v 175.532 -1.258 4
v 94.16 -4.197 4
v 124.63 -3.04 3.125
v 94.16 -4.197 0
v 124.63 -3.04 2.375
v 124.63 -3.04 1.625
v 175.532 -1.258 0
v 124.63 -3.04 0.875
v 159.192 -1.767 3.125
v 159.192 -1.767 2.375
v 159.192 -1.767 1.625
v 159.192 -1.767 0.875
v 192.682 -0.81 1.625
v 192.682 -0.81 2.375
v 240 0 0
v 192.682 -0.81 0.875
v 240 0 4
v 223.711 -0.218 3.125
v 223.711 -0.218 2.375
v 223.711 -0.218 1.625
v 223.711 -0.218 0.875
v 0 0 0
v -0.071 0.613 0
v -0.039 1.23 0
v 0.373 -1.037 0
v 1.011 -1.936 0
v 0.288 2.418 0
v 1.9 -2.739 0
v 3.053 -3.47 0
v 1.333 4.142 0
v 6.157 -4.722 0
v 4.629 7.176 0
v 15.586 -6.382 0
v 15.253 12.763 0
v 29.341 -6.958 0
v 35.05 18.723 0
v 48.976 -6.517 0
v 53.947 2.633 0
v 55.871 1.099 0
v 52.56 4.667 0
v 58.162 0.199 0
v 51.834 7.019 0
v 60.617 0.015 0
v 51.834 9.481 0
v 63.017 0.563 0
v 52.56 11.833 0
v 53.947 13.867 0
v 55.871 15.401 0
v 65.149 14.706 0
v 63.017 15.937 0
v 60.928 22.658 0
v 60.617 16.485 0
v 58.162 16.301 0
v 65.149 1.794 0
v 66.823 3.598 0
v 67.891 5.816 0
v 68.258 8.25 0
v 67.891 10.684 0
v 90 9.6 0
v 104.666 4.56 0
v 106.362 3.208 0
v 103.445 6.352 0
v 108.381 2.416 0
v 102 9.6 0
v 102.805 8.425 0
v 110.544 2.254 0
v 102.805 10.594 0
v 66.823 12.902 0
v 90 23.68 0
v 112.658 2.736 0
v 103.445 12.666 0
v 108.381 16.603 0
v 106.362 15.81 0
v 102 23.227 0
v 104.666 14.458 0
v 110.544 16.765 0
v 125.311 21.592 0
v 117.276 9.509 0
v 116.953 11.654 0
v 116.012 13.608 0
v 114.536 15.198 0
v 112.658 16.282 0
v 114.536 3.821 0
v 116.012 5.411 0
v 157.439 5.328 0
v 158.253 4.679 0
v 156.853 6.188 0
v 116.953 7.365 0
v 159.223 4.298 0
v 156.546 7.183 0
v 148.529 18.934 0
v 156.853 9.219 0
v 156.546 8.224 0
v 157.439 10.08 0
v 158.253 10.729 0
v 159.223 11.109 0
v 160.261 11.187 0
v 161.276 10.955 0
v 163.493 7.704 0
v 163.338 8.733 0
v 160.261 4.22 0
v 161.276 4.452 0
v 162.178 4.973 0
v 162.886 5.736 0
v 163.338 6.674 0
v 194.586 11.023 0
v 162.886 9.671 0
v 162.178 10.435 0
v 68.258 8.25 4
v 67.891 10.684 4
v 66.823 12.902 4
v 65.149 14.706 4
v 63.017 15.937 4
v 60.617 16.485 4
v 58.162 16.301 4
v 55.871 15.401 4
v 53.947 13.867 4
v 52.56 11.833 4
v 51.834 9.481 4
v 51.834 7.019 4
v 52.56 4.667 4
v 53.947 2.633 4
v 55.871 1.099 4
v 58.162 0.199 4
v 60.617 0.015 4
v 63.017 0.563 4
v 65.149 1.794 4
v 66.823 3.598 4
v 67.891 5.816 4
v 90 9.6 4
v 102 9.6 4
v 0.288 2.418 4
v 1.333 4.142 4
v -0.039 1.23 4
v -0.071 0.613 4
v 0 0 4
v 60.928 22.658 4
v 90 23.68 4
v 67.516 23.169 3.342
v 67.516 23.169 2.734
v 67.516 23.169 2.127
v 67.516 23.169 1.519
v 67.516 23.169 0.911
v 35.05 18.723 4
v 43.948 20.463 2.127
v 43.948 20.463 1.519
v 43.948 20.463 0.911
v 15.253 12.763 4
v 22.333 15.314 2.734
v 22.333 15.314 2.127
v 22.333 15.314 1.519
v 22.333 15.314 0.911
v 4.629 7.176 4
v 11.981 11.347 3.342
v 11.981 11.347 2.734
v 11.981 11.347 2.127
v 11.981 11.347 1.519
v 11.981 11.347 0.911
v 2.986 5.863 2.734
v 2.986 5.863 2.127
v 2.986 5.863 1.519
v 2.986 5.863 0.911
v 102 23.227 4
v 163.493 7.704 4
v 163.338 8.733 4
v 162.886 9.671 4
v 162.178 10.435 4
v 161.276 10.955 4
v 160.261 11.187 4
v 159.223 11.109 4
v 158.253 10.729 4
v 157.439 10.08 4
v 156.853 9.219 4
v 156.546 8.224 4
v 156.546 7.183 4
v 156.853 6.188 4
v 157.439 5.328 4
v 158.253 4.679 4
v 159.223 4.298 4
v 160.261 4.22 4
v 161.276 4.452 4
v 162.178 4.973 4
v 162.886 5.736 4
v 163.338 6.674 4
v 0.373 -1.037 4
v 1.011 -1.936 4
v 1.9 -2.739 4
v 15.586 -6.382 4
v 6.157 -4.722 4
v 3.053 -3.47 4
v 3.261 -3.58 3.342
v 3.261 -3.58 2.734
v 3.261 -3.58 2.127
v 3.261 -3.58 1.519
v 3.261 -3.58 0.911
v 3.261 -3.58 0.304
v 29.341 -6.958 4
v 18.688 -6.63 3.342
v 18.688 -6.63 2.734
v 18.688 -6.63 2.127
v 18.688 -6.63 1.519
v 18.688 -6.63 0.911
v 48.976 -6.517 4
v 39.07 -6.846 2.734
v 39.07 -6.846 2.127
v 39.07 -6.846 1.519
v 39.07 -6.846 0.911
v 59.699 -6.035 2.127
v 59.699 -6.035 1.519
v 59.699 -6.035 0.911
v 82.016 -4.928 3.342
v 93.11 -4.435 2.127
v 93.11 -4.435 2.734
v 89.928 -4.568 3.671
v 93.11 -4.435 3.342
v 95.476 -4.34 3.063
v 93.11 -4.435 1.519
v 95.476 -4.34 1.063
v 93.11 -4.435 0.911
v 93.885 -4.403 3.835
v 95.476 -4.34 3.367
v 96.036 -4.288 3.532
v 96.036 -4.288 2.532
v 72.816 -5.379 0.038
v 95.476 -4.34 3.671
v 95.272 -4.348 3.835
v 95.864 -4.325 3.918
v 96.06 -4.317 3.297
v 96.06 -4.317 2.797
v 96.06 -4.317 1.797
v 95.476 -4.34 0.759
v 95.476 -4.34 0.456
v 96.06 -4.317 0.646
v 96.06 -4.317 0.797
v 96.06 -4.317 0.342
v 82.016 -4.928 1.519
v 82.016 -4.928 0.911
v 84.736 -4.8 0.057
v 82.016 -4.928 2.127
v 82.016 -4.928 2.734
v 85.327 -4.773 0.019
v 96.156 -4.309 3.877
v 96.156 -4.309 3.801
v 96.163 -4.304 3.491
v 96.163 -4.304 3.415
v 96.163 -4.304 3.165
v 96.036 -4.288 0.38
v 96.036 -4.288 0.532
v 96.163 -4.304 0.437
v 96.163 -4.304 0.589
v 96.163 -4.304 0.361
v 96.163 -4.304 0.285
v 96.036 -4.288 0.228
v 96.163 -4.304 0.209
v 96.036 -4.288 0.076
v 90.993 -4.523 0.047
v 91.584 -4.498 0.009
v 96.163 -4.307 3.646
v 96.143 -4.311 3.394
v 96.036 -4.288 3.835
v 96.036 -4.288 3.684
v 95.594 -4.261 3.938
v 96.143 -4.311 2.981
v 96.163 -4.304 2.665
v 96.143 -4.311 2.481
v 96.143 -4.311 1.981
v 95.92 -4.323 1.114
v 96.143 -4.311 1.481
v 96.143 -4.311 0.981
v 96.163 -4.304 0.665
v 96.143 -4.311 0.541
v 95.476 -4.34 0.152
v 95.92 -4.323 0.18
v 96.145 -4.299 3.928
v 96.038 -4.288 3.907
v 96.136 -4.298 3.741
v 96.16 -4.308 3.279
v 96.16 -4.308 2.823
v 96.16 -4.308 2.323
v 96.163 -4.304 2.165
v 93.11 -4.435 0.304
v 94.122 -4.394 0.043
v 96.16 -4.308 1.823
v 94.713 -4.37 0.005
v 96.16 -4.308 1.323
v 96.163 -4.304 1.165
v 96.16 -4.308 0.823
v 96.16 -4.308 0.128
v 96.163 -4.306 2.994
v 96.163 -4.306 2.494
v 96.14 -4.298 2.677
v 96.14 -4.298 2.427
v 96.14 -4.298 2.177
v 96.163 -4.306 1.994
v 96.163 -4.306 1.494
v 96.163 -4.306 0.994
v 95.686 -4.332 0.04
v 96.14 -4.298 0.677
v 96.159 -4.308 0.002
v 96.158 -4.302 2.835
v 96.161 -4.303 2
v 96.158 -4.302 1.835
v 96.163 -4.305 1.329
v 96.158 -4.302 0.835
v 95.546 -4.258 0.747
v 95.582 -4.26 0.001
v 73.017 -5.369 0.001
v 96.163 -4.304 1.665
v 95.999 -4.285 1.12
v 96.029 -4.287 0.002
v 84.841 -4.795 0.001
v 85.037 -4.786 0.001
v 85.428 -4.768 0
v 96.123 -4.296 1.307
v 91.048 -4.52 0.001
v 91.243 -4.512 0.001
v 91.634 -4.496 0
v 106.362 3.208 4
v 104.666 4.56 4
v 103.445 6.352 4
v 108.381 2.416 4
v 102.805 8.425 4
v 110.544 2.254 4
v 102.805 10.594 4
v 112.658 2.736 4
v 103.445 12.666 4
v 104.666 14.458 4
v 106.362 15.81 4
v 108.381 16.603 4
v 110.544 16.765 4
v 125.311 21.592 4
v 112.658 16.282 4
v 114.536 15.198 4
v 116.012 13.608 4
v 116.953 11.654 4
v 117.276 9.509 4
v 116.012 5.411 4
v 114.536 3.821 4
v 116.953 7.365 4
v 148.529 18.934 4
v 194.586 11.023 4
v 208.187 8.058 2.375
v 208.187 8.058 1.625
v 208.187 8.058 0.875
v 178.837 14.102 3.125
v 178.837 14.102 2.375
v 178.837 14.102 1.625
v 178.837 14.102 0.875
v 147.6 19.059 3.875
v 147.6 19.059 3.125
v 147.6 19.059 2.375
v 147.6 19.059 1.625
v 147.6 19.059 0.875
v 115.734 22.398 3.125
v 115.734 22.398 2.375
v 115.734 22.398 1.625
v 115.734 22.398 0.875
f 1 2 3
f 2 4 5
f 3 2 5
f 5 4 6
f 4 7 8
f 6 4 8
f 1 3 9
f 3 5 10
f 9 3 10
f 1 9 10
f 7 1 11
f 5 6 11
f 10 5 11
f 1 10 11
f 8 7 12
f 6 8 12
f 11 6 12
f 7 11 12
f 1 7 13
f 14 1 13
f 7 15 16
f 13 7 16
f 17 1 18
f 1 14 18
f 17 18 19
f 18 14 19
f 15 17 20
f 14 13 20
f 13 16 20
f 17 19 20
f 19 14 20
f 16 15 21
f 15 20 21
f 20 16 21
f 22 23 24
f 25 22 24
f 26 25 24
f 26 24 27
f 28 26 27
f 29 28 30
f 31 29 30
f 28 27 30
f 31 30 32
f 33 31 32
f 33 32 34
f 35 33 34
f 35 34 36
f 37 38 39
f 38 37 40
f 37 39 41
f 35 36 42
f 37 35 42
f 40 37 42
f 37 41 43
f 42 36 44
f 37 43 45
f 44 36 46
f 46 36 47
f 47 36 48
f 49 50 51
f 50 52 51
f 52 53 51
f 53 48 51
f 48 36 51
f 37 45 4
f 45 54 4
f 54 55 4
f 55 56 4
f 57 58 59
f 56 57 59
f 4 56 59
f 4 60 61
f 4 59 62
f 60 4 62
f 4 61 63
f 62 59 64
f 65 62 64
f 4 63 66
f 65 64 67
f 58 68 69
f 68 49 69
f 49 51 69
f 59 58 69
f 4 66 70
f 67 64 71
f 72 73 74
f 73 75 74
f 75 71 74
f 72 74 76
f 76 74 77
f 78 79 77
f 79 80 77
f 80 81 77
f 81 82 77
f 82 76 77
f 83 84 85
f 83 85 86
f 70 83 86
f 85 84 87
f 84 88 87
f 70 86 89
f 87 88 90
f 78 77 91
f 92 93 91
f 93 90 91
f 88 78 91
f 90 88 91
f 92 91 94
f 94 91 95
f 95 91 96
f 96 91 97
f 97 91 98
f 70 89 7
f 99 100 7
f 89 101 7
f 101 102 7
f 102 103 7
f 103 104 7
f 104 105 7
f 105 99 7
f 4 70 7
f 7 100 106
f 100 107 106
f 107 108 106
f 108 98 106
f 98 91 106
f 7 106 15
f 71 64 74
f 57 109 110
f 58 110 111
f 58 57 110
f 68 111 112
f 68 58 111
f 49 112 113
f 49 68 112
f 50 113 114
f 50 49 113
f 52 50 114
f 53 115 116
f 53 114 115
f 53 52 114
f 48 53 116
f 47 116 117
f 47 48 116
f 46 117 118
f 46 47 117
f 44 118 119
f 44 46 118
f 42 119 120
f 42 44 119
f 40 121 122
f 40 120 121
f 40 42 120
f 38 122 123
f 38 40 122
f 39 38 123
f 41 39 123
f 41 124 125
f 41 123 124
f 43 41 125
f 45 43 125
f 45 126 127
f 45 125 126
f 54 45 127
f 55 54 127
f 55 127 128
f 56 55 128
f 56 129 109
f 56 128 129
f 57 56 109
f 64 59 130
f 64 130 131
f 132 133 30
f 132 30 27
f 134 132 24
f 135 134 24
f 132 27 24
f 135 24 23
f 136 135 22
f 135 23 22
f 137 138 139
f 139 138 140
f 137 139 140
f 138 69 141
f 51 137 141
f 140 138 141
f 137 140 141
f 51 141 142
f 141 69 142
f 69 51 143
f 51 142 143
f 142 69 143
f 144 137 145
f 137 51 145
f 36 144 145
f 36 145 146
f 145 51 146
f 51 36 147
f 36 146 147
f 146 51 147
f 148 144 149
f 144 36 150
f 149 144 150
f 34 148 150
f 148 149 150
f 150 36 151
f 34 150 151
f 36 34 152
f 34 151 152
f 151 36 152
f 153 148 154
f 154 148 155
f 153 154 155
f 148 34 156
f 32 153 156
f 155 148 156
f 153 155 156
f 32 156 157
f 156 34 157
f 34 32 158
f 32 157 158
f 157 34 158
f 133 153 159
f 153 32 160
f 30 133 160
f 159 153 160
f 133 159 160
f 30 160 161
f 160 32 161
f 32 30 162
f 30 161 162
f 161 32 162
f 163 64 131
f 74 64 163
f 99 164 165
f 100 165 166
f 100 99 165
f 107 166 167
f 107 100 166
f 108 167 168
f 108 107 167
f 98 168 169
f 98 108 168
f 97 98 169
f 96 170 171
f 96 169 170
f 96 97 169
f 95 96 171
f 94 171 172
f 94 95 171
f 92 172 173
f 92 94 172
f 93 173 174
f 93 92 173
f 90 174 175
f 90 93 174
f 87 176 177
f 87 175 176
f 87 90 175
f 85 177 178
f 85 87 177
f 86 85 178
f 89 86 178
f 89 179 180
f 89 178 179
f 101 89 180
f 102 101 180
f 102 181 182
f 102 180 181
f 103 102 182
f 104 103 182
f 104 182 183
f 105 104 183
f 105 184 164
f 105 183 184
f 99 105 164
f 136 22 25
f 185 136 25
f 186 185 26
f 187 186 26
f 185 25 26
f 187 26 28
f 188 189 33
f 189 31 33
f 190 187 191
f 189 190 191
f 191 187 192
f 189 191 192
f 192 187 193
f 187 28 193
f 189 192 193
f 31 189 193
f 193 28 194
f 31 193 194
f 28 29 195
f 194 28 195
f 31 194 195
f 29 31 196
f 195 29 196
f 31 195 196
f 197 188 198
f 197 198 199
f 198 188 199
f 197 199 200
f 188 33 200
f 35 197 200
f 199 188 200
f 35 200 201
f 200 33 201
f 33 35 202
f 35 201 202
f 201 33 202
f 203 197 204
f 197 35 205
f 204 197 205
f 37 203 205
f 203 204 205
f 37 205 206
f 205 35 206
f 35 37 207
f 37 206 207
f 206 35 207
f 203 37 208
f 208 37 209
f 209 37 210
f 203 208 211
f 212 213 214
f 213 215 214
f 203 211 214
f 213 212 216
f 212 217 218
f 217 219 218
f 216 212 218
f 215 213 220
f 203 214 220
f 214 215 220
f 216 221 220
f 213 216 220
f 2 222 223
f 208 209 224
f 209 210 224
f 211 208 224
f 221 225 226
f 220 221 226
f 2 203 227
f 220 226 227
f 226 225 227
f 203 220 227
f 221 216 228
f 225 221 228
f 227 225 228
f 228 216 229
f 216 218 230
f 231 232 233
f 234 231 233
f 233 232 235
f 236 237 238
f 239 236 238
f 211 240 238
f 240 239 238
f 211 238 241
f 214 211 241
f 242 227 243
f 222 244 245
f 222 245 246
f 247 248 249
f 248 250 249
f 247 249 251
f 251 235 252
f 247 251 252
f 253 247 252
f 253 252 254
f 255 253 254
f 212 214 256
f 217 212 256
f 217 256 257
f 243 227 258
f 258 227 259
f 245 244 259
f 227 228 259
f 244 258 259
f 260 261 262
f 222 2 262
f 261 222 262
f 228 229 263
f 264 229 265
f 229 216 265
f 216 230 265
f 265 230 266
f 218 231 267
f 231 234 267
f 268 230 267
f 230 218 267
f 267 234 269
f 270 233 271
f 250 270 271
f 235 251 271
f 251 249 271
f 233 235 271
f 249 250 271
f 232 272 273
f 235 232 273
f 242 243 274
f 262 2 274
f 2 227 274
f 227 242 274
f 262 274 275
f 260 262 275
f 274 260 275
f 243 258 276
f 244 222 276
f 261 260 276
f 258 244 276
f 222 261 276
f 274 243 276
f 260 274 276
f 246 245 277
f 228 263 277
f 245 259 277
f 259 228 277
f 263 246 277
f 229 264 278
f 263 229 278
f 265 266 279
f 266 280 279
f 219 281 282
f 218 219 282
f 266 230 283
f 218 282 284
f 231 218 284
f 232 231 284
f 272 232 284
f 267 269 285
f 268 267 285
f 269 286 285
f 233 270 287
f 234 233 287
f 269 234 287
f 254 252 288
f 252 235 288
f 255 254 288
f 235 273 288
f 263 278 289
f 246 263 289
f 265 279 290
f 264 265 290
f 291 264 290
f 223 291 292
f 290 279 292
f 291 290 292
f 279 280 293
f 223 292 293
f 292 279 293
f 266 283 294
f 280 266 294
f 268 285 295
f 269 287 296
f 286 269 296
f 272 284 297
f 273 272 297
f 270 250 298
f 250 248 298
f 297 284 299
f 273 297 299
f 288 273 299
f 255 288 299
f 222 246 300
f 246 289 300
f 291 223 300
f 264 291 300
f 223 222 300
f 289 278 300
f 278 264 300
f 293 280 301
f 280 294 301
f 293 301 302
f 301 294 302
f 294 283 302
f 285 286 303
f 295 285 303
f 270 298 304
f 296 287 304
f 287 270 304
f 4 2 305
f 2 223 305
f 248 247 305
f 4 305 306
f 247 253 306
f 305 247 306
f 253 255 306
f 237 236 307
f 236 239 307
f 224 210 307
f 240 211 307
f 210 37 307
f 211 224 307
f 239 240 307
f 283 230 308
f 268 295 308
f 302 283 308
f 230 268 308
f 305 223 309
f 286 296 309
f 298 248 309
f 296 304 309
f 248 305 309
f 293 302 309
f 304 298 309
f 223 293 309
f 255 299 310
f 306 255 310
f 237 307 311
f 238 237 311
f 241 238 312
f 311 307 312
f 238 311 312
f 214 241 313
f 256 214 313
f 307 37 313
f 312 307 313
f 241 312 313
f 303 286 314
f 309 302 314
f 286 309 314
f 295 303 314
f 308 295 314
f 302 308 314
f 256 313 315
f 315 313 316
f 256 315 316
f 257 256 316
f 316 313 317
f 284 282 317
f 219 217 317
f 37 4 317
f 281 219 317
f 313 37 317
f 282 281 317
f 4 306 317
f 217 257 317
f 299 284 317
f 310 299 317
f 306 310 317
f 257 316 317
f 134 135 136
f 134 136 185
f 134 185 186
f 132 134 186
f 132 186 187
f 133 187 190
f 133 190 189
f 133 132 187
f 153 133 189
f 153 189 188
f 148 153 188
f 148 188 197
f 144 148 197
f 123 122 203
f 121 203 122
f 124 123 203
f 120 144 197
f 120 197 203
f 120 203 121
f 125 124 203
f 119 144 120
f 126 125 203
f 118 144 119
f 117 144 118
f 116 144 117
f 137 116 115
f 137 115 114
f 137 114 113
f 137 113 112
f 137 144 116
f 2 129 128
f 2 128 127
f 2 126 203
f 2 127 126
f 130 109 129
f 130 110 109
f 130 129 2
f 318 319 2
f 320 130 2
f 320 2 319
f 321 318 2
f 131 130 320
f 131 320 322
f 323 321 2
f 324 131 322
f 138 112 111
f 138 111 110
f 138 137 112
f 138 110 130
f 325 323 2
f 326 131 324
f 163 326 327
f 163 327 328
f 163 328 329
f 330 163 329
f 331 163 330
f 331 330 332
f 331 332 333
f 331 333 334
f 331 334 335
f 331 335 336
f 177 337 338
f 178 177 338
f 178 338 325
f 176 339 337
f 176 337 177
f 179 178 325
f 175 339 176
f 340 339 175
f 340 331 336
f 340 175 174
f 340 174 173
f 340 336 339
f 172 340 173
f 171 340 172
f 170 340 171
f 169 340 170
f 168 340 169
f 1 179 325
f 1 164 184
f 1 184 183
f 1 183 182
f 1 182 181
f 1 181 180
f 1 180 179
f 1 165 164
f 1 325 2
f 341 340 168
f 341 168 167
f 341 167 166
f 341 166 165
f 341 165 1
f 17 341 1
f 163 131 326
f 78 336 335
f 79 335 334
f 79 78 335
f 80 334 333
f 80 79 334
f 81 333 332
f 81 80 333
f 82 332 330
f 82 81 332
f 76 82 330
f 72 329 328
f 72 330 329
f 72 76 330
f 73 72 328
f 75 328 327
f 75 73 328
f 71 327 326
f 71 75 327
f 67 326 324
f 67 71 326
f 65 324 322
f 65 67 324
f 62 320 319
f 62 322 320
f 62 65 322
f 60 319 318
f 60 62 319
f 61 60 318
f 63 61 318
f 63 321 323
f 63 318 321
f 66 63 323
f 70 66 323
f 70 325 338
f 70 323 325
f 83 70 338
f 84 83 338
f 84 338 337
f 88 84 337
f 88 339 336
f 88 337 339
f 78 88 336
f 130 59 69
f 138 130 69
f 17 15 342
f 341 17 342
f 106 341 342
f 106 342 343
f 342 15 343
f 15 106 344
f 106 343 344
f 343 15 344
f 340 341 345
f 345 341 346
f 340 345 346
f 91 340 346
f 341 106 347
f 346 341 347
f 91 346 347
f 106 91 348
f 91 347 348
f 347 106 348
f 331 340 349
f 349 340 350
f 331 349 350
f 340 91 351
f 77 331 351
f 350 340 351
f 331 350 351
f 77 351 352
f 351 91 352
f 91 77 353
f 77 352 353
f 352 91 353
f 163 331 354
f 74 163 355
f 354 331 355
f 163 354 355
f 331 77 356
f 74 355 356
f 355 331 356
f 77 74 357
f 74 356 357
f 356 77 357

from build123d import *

# Parameters (mm, degrees)
EXTRUDE_1_DEPTH     = 4
SKETCH_2_R          = 8.2578
CUT_EXTRUDE_1_DEPTH = 242.202599346
SKETCH_3_R          = 7.275764765
CUT_EXTRUDE_2_DEPTH = 242.202599346
SKETCH_4_R          = 3.49305919
CUT_EXTRUDE_3_DEPTH = 242.202599346
SKETCH_5_W          = 12
SKETCH_5_H          = 20.4
CUT_EXTRUDE_4_DEPTH = 242.202599346


with BuildPart() as part:
    # 草图1 → 凸台-拉伸1 (new body)
    with BuildSketch(Plane.XY):
        with BuildLine():
            add(Edge.make_bspline(
                [(240, 0), (238.17502762, 0.503877157), (234.552675186, 1.504013196), (229.144749778, 2.936711102), (223.80806151, 4.308267422), (218.540948315, 5.617098938), (213.343197185, 6.866529147), (208.214254003, 8.058388035), (203.15369138, 9.194718503), (198.161080577, 10.277336529), (193.236020433, 11.307957122), (188.378126395, 12.288176228), (183.587030984, 13.219487875), (178.862381096, 14.103288415), (174.20383633, 14.94088935), (169.611066641, 15.733517024), (165.083753424, 16.48233437), (160.621585255, 17.188430181), (156.224259941, 17.852838479), (151.891482042, 18.476541482), (147.622963921, 19.060474437), (143.418423037, 19.605526314), (139.277584839, 20.112556204), (135.200180439, 20.582388904), (131.185946744, 21.015818963), (127.234627591, 21.413621778), (123.345973004, 21.776552314), (119.519739391, 22.105341593), (115.755690711, 22.400727766), (112.053595721, 22.663373335), (108.413239177, 22.894176737), (104.834380856, 23.09312439), (101.31690831, 23.263502654), (98.991812062, 23.353021494), (97.839651, 23.397381)],
                knots=[0, 0, 0, 0, 0.039336668, 0.078078592, 0.116236834, 0.153821599, 0.190842315, 0.227307743, 0.263226027, 0.298604748, 0.333451008, 0.367771481, 0.401572442, 0.434859826, 0.467639254, 0.499916089, 0.53169544, 0.562982199, 0.593781082, 0.62409661, 0.653933172, 0.683295, 0.712186209, 0.740610792, 0.768572632, 0.796075522, 0.823123146, 0.849719099, 0.87586689, 0.901569938, 0.926831572, 0.951655041, 0.976043495, 1, 1, 1, 1], degree=3))
            add(Edge.make_bspline(
                [(97.839651, 23.397381), (97.226966307, 23.449039102), (96.614219107, 23.500702474), (95.999811647, 23.51949076), (95.999560338, 23.519500462), (95.999120662, 23.519516542), (95.998241355, 23.51954958), (95.996482988, 23.519613016), (95.992966008, 23.519741888), (95.985932345, 23.519998315), (95.971865659, 23.520510119), (95.943736443, 23.521535357), (95.887493304, 23.523574403), (95.775067579, 23.527626449), (95.550458266, 23.535617202), (95.102207861, 23.551142578), (94.209582037, 23.580385825), (92.439845376, 23.631737223), (89.936085165, 23.685664421), (86.966992664, 23.719873594), (84.045559907, 23.724232935), (81.17204691, 23.699658881), (78.346701734, 23.647058523), (75.569762496, 23.567335691), (72.841456217, 23.461398305), (70.161999702, 23.330141011), (67.531597571, 23.174466006), (64.95044447, 22.995263944), (62.418723463, 22.793422793), (59.936605574, 22.569833811), (57.504251516, 22.325372701), (55.12180932, 22.06092015), (52.789416328, 21.777345145), (50.507198451, 21.475512573), (48.275269484, 21.156284343), (46.093732456, 20.820512998), (43.962679202, 20.469041082), (41.882190516, 20.102709676), (39.852336011, 19.722346633), (37.873174485, 19.328773149), (35.944754253, 18.922799873), (34.0671133, 18.505228482), (32.240279689, 18.076847911), (30.464271312, 17.638437807), (28.739096854, 17.190765253), (27.064755379, 16.734584348), (25.441236471, 16.270638001), (23.86852294, 15.799649451), (22.346586305, 15.322338273), (20.875393699, 14.839395746), (19.454901269, 14.351509133), (18.085059478, 13.859344064), (16.765811981, 13.363548129), (15.497095001, 12.86475515), (14.278838907, 12.363578802), (13.110967321, 11.860617848), (11.993400347, 11.356444633), (10.926050231, 10.851619269), (9.908825297, 10.346679325), (8.941629343, 9.842141012), (8.024362218, 9.338498323), (7.156916873, 8.836227353), (6.339185804, 8.335776371), (5.571054955, 7.837575288), (4.852407002, 7.342028613), (4.183123727, 6.849513508), (3.563081387, 6.360384134), (2.992153385, 5.874967569), (2.470213127, 5.393559867), (1.997132785, 4.916427887), (1.572785196, 4.443807495), (1.197048819, 3.975898622), (0.869815163, 3.512865181), (0.590983079, 3.05484006), (0.360493175, 2.601923891), (0.178281873, 2.154192638), (0.044447501, 1.711745574), (-0.041317513, 1.274616255), (-0.077768968, 0.843189571), (-0.069253211, 0.416782674), (-0.023049702, 0.138718712), (0, 0)],
                knots=[0, 0, 0, 0, 0.017582927, 0.017584721, 0.017586524, 0.017590122, 0.017597308, 0.017611699, 0.017640462, 0.017697998, 0.017813068, 0.018043181, 0.018503318, 0.019423259, 0.021261803, 0.024933523, 0.032255526, 0.046813772, 0.075587352, 0.103904181, 0.131764656, 0.15916911, 0.186117882, 0.212611277, 0.238649567, 0.264233038, 0.289361946, 0.314036548, 0.338257085, 0.362023807, 0.385336967, 0.408196806, 0.430603595, 0.452557604, 0.474059098, 0.495108395, 0.515705802, 0.535851653, 0.5555463, 0.574790153, 0.593583618, 0.611927145, 0.629821241, 0.647266438, 0.664263315, 0.680812518, 0.696914758, 0.71257079, 0.727781465, 0.742547712, 0.756870557, 0.770751127, 0.784190676, 0.797190607, 0.809752443, 0.82187792, 0.83356895, 0.844827698, 0.855656579, 0.86605831, 0.876035987, 0.88559311, 0.894733667, 0.90346222, 0.911784009, 0.91970509, 0.927232459, 0.934374289, 0.941140136, 0.947541203, 0.953590719, 0.959304321, 0.96470053, 0.969801286, 0.974632512, 0.979224624, 0.983612928, 0.987837766, 0.991944216, 0.995981184, 1, 1, 1, 1], degree=3))
            add(Edge.make_bspline(
                [(0, 0), (0.032076521, -0.13691234), (0.096372164, -0.41134568), (0.252263385, -0.808249044), (0.451122139, -1.192622996), (0.69700614, -1.563551239), (0.988428719, -1.92129973), (1.325470715, -2.265889289), (1.707830218, -2.597453587), (2.135369336, -2.916109668), (2.607944078, -3.221977371), (3.125444179, -3.515158656), (3.687763801, -3.795749274), (4.294807935, -4.06382671), (4.946480007, -4.319465862), (5.642683289, -4.56273801), (6.383322015, -4.793706396), (7.168297169, -5.012439824), (7.997510637, -5.219004038), (8.870863998, -5.413468384), (9.788258839, -5.595905068), (10.749597368, -5.766393087), (11.754783929, -5.925012238), (12.80372392, -6.071852048), (13.896326279, -6.20700313), (15.03250273, -6.330565391), (16.212168398, -6.442646554), (17.435242528, -6.543362452), (18.70164871, -6.632831224), (20.011315794, -6.711188759), (21.364177656, -6.778571473), (22.760174201, -6.835130772), (24.199251318, -6.881025382), (25.681361566, -6.916429589), (27.206464919, -6.941520357), (28.774527995, -6.956497223), (30.385526154, -6.961562921), (32.039442244, -6.956939132), (33.736267756, -6.942859097), (35.476002731, -6.919568942), (37.258656961, -6.887336234), (39.084249281, -6.846431872), (40.952808512, -6.797158584), (42.864373386, -6.739820317), (44.818992939, -6.674750629), (46.816726763, -6.602296183), (48.857644498, -6.522816498), (50.941828345, -6.436704019), (53.069369863, -6.344356166), (55.240372802, -6.246201986), (57.454951474, -6.142682478), (59.713232279, -6.034268246), (62.015352511, -5.921443226), (64.361461256, -5.804722162), (66.751718806, -5.684634046), (69.186297284, -5.561739751), (71.665379639, -5.436614277), (74.189160956, -5.309864833), (76.757846377, -5.182117382), (79.371652787, -5.054022914), (82.030807732, -4.926257095), (84.73554955, -4.799522903), (87.486127142, -4.674544836), (90.282798977, -4.552071591), (92.642339394, -4.453149116), (94.310976431, -4.385795256), (95.152933321, -4.352501022), (95.575827168, -4.335958114), (95.787753729, -4.327713039), (95.893836919, -4.323595898), (95.946908648, -4.321539514), (95.973451655, -4.320511682), (95.986725325, -4.319998128), (95.993362343, -4.319741909), (95.996681321, -4.31961303), (95.998340689, -4.319549549), (95.999170328, -4.319516576), (95.999585007, -4.319500464), (95.999821974, -4.31949074), (96.614265681, -4.299682778), (95.387248082, -4.248529419), (94.160349, -4.197381)],
                knots=[0, 0, 0, 0, 0.004211936, 0.008442597, 0.012745008, 0.017169257, 0.021761069, 0.026561038, 0.031604396, 0.036921232, 0.042536951, 0.048472805, 0.054746572, 0.061373036, 0.068364506, 0.075731265, 0.08348188, 0.091623508, 0.100162165, 0.109102894, 0.118449932, 0.128206846, 0.138376653, 0.148961891, 0.159964697, 0.171386903, 0.183230054, 0.195495446, 0.208184214, 0.221297298, 0.234835543, 0.248799652, 0.263190262, 0.278007943, 0.293253202, 0.308926527, 0.325028363, 0.341559171, 0.358519389, 0.375909461, 0.393729869, 0.411981116, 0.43066372, 0.449778258, 0.46932536, 0.489305671, 0.509719931, 0.530568926, 0.551853524, 0.573574631, 0.595733264, 0.618330507, 0.641367513, 0.664845549, 0.688765955, 0.713130163, 0.73793972, 0.763196258, 0.788901524, 0.81505735, 0.841665711, 0.868728677, 0.896248423, 0.924227279, 0.95266766, 0.967061719, 0.974302362, 0.977933601, 0.979751957, 0.980661821, 0.981116917, 0.981344515, 0.981458314, 0.981515228, 0.981543676, 0.981557909, 0.981565021, 0.981568572, 0.981570353, 0.981572133, 1, 1, 1, 1], degree=3))
            add(Edge.make_bspline(
                [(94.160349, -4.197381), (95.353940767, -4.155227461), (97.763015391, -4.070147265), (101.409211271, -3.936336063), (105.120752046, -3.797271169), (108.897416594, -3.653121285), (112.738995118, -3.504606578), (116.645264344, -3.352316109), (120.615996167, -3.196895567), (124.650953948, -3.038988445), (128.749894718, -2.879255578), (132.912568867, -2.718356211), (137.138720999, -2.556957029), (141.428088913, -2.395720601), (145.780404472, -2.235306022), (150.195392741, -2.076360401), (154.672773676, -1.919522787), (159.212259498, -1.765403314), (163.813556162, -1.614598923), (168.47636194, -1.467667479), (173.20036748, -1.325131951), (177.985254586, -1.187478891), (182.830695046, -1.055134634), (187.736349264, -0.928478427), (192.701865657, -0.807814836), (197.726878229, -0.693385327), (202.811005017, -0.585338659), (207.953845588, -0.48374147), (213.154977694, -0.388553332), (218.413955211, -0.299632134), (223.73030432, -0.216683041), (229.103521669, -0.139399485), (234.53306244, -0.066869757), (238.171498969, -0.022365615), (240, 0)],
                knots=[0, 0, 0, 0, 0.024556932, 0.049564251, 0.075020475, 0.100924071, 0.127273404, 0.1540668, 0.181302523, 0.208978784, 0.23709373, 0.26564548, 0.294632117, 0.324051674, 0.353902153, 0.384181539, 0.414887763, 0.446018758, 0.477572404, 0.509546548, 0.541939027, 0.574747624, 0.607970061, 0.641604036, 0.675647154, 0.710096952, 0.744950883, 0.780206276, 0.815860328, 0.851910079, 0.888352393, 0.925183922, 0.962401082, 1, 1, 1, 1], degree=3))
        make_face()
    extrude(amount=EXTRUDE_1_DEPTH)

    # 草图2 → 切除-拉伸1 (cut, through all)
    with BuildSketch(Plane.XY):
        with Locations((60, 8.25)):
            Circle(SKETCH_2_R)
    extrude(amount=CUT_EXTRUDE_1_DEPTH, mode=Mode.SUBTRACT)

    # 草图3 → 切除-拉伸2 (cut, through all)
    with BuildSketch(Plane.XY):
        with Locations((110, 9.50926)):
            Circle(SKETCH_3_R)
    extrude(amount=CUT_EXTRUDE_2_DEPTH, mode=Mode.SUBTRACT)

    # 草图4 → 切除-拉伸3 (cut, through all)
    with BuildSketch(Plane.XY):
        with Locations((160, 7.703706)):
            Circle(SKETCH_4_R)
    extrude(amount=CUT_EXTRUDE_3_DEPTH, mode=Mode.SUBTRACT)

    # 草图5 → 切除-拉伸4 (cut, through all)
    with BuildSketch(Plane.XY):
        with Locations((96, 19.8)):
            Rectangle(SKETCH_5_W, SKETCH_5_H)
    extrude(amount=CUT_EXTRUDE_4_DEPTH, mode=Mode.SUBTRACT)


solid = part.part
